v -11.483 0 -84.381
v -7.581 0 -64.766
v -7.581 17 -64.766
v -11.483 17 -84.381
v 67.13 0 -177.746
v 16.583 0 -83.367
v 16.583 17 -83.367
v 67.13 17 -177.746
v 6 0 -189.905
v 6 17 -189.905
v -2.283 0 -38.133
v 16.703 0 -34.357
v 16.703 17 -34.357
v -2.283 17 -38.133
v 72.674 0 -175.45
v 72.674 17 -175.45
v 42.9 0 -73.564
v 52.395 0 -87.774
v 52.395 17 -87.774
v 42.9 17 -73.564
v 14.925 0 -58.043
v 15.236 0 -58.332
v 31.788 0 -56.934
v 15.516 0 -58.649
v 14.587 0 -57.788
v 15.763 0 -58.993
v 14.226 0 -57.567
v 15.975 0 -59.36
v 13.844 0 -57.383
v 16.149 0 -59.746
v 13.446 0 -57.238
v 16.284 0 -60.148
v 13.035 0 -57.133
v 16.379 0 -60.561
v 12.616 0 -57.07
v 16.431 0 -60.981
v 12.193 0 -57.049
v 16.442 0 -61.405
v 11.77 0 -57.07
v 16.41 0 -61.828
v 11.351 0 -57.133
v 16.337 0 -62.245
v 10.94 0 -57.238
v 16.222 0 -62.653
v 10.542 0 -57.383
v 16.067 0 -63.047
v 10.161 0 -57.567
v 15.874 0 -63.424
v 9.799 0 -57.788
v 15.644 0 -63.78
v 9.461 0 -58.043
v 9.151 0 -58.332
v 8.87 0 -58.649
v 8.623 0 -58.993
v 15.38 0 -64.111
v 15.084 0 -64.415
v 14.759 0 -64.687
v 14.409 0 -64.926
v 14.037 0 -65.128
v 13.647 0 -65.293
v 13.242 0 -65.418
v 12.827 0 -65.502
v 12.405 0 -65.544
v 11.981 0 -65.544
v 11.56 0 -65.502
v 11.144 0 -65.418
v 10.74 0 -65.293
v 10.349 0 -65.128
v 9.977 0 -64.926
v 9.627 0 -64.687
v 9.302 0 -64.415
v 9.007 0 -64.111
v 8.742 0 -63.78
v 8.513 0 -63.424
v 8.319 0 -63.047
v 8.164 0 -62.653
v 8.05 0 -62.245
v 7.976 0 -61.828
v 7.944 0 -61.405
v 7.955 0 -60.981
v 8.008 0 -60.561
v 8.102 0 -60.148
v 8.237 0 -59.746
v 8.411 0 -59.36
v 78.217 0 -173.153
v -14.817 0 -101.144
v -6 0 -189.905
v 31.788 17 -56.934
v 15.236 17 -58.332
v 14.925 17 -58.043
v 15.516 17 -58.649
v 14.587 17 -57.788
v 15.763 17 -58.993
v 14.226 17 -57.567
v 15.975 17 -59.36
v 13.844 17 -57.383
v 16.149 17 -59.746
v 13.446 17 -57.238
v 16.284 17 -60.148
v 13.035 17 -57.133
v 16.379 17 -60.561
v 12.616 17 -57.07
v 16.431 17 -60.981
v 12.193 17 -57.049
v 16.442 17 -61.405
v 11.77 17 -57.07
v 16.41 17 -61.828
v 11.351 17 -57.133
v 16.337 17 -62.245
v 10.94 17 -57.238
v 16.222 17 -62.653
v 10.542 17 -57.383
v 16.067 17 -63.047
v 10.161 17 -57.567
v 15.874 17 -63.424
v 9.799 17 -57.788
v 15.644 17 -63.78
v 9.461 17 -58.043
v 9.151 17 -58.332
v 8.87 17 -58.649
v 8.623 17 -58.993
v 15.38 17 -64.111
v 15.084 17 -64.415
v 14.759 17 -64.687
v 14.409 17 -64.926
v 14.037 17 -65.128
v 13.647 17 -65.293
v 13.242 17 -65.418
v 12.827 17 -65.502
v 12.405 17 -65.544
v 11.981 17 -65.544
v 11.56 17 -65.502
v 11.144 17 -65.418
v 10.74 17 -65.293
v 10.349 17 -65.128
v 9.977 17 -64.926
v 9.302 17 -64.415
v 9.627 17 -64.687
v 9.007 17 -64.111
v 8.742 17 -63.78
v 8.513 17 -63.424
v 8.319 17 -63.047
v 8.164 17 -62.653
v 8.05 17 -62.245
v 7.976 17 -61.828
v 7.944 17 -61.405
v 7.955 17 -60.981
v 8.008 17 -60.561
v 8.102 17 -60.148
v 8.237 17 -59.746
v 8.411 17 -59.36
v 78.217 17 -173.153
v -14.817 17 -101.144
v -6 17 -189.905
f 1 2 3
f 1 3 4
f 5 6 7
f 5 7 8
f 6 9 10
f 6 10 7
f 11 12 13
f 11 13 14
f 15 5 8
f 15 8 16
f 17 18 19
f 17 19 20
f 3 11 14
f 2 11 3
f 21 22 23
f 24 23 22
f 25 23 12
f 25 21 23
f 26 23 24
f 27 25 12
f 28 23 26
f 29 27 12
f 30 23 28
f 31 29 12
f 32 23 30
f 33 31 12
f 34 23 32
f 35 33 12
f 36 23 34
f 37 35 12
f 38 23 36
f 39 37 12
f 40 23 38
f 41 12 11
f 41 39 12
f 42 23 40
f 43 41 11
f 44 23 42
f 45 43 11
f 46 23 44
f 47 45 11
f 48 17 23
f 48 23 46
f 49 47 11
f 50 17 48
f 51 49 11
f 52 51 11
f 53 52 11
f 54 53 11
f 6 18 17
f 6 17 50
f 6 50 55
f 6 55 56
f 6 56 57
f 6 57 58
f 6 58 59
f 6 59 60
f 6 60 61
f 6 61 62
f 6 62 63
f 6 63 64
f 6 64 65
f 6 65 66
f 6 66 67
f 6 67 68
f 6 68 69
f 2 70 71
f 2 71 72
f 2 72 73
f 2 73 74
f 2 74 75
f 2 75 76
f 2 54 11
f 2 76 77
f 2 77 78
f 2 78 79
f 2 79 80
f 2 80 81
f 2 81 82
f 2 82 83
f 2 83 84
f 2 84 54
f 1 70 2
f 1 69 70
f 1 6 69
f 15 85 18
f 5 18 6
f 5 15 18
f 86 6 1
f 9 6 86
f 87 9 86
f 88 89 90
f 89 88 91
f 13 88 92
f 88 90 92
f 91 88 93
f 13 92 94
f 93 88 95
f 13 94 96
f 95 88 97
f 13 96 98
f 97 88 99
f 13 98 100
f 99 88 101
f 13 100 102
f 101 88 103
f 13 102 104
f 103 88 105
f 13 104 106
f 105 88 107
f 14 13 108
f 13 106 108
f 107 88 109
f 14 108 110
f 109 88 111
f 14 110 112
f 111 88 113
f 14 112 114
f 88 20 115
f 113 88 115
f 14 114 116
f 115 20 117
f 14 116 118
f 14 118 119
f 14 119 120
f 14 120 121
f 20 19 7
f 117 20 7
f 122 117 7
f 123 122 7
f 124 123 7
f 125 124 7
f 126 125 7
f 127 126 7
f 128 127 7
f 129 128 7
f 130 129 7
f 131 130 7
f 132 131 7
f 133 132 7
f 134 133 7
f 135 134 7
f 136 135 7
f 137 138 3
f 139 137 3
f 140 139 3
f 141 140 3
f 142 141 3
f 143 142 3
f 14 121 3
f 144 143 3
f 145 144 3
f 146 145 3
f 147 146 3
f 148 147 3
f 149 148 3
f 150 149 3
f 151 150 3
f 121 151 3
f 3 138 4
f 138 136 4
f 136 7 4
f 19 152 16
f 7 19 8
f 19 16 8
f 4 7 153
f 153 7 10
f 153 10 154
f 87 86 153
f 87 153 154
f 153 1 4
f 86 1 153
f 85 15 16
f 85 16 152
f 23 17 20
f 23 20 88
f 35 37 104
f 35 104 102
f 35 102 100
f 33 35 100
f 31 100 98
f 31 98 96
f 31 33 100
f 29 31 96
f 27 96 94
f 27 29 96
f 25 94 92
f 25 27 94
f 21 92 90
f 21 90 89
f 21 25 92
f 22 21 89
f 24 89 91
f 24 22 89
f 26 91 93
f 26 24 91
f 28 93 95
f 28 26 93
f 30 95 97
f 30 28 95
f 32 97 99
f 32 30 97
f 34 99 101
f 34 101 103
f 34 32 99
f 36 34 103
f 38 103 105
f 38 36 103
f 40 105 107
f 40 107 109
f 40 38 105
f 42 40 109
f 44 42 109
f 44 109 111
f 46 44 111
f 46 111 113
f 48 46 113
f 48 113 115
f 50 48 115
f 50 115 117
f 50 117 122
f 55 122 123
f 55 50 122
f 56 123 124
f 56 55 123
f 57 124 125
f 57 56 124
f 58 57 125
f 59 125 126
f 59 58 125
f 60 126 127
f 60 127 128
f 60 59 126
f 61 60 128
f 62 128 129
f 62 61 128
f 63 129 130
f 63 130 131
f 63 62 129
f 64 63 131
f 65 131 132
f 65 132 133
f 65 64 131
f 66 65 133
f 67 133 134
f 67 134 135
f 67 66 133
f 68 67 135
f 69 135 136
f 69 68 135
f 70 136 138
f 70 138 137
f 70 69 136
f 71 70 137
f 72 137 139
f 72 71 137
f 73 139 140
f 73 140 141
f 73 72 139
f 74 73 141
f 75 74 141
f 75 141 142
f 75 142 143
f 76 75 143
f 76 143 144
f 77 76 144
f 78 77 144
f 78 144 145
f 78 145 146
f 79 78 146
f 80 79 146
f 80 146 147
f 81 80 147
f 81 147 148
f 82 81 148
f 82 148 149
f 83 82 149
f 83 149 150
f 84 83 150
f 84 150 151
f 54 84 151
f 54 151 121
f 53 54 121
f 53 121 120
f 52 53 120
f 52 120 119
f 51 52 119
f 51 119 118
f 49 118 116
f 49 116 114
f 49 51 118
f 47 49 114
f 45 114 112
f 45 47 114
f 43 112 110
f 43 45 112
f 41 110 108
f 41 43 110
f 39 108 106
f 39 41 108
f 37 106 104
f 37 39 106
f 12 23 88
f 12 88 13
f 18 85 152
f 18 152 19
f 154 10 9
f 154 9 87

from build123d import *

# Parameters (mm, degrees)
ESQUISSE1_R        = 4.25
BOSS_EXTRU_1_DEPTH = 17


with BuildPart() as part:
    # Esquisse1 → Boss.-Extru.1 (new body)
    with BuildSketch(Plane(origin=(0, 0, 0), x_dir=(1, 0, 0), z_dir=(0, 1, 0))):
        Polygon((-6, 189.905239528), (0, 189.905239528), (6, 189.905239528), (16.582677371, 83.366748834), (67.130311691, 177.74566451), (72.673588887, 175.449563916), (78.216866082, 173.153463322), (52.395009204, 87.774425431), (42.899827823, 73.563882257), (31.788423162, 56.934490011), (16.702518765, 34.356838555), (-2.283322325, 38.133357153), (-7.580787473, 64.765512901), (-11.482593913, 84.381218509), (-14.816858212, 101.143697095), align=None)
        with Locations(Location((12.193145126, 61.299080025, 0), (0, 0, 270))):  # turned: the seam where the file's is
            Circle(ESQUISSE1_R, mode=Mode.SUBTRACT)
    extrude(amount=BOSS_EXTRU_1_DEPTH)


solid = part.part
